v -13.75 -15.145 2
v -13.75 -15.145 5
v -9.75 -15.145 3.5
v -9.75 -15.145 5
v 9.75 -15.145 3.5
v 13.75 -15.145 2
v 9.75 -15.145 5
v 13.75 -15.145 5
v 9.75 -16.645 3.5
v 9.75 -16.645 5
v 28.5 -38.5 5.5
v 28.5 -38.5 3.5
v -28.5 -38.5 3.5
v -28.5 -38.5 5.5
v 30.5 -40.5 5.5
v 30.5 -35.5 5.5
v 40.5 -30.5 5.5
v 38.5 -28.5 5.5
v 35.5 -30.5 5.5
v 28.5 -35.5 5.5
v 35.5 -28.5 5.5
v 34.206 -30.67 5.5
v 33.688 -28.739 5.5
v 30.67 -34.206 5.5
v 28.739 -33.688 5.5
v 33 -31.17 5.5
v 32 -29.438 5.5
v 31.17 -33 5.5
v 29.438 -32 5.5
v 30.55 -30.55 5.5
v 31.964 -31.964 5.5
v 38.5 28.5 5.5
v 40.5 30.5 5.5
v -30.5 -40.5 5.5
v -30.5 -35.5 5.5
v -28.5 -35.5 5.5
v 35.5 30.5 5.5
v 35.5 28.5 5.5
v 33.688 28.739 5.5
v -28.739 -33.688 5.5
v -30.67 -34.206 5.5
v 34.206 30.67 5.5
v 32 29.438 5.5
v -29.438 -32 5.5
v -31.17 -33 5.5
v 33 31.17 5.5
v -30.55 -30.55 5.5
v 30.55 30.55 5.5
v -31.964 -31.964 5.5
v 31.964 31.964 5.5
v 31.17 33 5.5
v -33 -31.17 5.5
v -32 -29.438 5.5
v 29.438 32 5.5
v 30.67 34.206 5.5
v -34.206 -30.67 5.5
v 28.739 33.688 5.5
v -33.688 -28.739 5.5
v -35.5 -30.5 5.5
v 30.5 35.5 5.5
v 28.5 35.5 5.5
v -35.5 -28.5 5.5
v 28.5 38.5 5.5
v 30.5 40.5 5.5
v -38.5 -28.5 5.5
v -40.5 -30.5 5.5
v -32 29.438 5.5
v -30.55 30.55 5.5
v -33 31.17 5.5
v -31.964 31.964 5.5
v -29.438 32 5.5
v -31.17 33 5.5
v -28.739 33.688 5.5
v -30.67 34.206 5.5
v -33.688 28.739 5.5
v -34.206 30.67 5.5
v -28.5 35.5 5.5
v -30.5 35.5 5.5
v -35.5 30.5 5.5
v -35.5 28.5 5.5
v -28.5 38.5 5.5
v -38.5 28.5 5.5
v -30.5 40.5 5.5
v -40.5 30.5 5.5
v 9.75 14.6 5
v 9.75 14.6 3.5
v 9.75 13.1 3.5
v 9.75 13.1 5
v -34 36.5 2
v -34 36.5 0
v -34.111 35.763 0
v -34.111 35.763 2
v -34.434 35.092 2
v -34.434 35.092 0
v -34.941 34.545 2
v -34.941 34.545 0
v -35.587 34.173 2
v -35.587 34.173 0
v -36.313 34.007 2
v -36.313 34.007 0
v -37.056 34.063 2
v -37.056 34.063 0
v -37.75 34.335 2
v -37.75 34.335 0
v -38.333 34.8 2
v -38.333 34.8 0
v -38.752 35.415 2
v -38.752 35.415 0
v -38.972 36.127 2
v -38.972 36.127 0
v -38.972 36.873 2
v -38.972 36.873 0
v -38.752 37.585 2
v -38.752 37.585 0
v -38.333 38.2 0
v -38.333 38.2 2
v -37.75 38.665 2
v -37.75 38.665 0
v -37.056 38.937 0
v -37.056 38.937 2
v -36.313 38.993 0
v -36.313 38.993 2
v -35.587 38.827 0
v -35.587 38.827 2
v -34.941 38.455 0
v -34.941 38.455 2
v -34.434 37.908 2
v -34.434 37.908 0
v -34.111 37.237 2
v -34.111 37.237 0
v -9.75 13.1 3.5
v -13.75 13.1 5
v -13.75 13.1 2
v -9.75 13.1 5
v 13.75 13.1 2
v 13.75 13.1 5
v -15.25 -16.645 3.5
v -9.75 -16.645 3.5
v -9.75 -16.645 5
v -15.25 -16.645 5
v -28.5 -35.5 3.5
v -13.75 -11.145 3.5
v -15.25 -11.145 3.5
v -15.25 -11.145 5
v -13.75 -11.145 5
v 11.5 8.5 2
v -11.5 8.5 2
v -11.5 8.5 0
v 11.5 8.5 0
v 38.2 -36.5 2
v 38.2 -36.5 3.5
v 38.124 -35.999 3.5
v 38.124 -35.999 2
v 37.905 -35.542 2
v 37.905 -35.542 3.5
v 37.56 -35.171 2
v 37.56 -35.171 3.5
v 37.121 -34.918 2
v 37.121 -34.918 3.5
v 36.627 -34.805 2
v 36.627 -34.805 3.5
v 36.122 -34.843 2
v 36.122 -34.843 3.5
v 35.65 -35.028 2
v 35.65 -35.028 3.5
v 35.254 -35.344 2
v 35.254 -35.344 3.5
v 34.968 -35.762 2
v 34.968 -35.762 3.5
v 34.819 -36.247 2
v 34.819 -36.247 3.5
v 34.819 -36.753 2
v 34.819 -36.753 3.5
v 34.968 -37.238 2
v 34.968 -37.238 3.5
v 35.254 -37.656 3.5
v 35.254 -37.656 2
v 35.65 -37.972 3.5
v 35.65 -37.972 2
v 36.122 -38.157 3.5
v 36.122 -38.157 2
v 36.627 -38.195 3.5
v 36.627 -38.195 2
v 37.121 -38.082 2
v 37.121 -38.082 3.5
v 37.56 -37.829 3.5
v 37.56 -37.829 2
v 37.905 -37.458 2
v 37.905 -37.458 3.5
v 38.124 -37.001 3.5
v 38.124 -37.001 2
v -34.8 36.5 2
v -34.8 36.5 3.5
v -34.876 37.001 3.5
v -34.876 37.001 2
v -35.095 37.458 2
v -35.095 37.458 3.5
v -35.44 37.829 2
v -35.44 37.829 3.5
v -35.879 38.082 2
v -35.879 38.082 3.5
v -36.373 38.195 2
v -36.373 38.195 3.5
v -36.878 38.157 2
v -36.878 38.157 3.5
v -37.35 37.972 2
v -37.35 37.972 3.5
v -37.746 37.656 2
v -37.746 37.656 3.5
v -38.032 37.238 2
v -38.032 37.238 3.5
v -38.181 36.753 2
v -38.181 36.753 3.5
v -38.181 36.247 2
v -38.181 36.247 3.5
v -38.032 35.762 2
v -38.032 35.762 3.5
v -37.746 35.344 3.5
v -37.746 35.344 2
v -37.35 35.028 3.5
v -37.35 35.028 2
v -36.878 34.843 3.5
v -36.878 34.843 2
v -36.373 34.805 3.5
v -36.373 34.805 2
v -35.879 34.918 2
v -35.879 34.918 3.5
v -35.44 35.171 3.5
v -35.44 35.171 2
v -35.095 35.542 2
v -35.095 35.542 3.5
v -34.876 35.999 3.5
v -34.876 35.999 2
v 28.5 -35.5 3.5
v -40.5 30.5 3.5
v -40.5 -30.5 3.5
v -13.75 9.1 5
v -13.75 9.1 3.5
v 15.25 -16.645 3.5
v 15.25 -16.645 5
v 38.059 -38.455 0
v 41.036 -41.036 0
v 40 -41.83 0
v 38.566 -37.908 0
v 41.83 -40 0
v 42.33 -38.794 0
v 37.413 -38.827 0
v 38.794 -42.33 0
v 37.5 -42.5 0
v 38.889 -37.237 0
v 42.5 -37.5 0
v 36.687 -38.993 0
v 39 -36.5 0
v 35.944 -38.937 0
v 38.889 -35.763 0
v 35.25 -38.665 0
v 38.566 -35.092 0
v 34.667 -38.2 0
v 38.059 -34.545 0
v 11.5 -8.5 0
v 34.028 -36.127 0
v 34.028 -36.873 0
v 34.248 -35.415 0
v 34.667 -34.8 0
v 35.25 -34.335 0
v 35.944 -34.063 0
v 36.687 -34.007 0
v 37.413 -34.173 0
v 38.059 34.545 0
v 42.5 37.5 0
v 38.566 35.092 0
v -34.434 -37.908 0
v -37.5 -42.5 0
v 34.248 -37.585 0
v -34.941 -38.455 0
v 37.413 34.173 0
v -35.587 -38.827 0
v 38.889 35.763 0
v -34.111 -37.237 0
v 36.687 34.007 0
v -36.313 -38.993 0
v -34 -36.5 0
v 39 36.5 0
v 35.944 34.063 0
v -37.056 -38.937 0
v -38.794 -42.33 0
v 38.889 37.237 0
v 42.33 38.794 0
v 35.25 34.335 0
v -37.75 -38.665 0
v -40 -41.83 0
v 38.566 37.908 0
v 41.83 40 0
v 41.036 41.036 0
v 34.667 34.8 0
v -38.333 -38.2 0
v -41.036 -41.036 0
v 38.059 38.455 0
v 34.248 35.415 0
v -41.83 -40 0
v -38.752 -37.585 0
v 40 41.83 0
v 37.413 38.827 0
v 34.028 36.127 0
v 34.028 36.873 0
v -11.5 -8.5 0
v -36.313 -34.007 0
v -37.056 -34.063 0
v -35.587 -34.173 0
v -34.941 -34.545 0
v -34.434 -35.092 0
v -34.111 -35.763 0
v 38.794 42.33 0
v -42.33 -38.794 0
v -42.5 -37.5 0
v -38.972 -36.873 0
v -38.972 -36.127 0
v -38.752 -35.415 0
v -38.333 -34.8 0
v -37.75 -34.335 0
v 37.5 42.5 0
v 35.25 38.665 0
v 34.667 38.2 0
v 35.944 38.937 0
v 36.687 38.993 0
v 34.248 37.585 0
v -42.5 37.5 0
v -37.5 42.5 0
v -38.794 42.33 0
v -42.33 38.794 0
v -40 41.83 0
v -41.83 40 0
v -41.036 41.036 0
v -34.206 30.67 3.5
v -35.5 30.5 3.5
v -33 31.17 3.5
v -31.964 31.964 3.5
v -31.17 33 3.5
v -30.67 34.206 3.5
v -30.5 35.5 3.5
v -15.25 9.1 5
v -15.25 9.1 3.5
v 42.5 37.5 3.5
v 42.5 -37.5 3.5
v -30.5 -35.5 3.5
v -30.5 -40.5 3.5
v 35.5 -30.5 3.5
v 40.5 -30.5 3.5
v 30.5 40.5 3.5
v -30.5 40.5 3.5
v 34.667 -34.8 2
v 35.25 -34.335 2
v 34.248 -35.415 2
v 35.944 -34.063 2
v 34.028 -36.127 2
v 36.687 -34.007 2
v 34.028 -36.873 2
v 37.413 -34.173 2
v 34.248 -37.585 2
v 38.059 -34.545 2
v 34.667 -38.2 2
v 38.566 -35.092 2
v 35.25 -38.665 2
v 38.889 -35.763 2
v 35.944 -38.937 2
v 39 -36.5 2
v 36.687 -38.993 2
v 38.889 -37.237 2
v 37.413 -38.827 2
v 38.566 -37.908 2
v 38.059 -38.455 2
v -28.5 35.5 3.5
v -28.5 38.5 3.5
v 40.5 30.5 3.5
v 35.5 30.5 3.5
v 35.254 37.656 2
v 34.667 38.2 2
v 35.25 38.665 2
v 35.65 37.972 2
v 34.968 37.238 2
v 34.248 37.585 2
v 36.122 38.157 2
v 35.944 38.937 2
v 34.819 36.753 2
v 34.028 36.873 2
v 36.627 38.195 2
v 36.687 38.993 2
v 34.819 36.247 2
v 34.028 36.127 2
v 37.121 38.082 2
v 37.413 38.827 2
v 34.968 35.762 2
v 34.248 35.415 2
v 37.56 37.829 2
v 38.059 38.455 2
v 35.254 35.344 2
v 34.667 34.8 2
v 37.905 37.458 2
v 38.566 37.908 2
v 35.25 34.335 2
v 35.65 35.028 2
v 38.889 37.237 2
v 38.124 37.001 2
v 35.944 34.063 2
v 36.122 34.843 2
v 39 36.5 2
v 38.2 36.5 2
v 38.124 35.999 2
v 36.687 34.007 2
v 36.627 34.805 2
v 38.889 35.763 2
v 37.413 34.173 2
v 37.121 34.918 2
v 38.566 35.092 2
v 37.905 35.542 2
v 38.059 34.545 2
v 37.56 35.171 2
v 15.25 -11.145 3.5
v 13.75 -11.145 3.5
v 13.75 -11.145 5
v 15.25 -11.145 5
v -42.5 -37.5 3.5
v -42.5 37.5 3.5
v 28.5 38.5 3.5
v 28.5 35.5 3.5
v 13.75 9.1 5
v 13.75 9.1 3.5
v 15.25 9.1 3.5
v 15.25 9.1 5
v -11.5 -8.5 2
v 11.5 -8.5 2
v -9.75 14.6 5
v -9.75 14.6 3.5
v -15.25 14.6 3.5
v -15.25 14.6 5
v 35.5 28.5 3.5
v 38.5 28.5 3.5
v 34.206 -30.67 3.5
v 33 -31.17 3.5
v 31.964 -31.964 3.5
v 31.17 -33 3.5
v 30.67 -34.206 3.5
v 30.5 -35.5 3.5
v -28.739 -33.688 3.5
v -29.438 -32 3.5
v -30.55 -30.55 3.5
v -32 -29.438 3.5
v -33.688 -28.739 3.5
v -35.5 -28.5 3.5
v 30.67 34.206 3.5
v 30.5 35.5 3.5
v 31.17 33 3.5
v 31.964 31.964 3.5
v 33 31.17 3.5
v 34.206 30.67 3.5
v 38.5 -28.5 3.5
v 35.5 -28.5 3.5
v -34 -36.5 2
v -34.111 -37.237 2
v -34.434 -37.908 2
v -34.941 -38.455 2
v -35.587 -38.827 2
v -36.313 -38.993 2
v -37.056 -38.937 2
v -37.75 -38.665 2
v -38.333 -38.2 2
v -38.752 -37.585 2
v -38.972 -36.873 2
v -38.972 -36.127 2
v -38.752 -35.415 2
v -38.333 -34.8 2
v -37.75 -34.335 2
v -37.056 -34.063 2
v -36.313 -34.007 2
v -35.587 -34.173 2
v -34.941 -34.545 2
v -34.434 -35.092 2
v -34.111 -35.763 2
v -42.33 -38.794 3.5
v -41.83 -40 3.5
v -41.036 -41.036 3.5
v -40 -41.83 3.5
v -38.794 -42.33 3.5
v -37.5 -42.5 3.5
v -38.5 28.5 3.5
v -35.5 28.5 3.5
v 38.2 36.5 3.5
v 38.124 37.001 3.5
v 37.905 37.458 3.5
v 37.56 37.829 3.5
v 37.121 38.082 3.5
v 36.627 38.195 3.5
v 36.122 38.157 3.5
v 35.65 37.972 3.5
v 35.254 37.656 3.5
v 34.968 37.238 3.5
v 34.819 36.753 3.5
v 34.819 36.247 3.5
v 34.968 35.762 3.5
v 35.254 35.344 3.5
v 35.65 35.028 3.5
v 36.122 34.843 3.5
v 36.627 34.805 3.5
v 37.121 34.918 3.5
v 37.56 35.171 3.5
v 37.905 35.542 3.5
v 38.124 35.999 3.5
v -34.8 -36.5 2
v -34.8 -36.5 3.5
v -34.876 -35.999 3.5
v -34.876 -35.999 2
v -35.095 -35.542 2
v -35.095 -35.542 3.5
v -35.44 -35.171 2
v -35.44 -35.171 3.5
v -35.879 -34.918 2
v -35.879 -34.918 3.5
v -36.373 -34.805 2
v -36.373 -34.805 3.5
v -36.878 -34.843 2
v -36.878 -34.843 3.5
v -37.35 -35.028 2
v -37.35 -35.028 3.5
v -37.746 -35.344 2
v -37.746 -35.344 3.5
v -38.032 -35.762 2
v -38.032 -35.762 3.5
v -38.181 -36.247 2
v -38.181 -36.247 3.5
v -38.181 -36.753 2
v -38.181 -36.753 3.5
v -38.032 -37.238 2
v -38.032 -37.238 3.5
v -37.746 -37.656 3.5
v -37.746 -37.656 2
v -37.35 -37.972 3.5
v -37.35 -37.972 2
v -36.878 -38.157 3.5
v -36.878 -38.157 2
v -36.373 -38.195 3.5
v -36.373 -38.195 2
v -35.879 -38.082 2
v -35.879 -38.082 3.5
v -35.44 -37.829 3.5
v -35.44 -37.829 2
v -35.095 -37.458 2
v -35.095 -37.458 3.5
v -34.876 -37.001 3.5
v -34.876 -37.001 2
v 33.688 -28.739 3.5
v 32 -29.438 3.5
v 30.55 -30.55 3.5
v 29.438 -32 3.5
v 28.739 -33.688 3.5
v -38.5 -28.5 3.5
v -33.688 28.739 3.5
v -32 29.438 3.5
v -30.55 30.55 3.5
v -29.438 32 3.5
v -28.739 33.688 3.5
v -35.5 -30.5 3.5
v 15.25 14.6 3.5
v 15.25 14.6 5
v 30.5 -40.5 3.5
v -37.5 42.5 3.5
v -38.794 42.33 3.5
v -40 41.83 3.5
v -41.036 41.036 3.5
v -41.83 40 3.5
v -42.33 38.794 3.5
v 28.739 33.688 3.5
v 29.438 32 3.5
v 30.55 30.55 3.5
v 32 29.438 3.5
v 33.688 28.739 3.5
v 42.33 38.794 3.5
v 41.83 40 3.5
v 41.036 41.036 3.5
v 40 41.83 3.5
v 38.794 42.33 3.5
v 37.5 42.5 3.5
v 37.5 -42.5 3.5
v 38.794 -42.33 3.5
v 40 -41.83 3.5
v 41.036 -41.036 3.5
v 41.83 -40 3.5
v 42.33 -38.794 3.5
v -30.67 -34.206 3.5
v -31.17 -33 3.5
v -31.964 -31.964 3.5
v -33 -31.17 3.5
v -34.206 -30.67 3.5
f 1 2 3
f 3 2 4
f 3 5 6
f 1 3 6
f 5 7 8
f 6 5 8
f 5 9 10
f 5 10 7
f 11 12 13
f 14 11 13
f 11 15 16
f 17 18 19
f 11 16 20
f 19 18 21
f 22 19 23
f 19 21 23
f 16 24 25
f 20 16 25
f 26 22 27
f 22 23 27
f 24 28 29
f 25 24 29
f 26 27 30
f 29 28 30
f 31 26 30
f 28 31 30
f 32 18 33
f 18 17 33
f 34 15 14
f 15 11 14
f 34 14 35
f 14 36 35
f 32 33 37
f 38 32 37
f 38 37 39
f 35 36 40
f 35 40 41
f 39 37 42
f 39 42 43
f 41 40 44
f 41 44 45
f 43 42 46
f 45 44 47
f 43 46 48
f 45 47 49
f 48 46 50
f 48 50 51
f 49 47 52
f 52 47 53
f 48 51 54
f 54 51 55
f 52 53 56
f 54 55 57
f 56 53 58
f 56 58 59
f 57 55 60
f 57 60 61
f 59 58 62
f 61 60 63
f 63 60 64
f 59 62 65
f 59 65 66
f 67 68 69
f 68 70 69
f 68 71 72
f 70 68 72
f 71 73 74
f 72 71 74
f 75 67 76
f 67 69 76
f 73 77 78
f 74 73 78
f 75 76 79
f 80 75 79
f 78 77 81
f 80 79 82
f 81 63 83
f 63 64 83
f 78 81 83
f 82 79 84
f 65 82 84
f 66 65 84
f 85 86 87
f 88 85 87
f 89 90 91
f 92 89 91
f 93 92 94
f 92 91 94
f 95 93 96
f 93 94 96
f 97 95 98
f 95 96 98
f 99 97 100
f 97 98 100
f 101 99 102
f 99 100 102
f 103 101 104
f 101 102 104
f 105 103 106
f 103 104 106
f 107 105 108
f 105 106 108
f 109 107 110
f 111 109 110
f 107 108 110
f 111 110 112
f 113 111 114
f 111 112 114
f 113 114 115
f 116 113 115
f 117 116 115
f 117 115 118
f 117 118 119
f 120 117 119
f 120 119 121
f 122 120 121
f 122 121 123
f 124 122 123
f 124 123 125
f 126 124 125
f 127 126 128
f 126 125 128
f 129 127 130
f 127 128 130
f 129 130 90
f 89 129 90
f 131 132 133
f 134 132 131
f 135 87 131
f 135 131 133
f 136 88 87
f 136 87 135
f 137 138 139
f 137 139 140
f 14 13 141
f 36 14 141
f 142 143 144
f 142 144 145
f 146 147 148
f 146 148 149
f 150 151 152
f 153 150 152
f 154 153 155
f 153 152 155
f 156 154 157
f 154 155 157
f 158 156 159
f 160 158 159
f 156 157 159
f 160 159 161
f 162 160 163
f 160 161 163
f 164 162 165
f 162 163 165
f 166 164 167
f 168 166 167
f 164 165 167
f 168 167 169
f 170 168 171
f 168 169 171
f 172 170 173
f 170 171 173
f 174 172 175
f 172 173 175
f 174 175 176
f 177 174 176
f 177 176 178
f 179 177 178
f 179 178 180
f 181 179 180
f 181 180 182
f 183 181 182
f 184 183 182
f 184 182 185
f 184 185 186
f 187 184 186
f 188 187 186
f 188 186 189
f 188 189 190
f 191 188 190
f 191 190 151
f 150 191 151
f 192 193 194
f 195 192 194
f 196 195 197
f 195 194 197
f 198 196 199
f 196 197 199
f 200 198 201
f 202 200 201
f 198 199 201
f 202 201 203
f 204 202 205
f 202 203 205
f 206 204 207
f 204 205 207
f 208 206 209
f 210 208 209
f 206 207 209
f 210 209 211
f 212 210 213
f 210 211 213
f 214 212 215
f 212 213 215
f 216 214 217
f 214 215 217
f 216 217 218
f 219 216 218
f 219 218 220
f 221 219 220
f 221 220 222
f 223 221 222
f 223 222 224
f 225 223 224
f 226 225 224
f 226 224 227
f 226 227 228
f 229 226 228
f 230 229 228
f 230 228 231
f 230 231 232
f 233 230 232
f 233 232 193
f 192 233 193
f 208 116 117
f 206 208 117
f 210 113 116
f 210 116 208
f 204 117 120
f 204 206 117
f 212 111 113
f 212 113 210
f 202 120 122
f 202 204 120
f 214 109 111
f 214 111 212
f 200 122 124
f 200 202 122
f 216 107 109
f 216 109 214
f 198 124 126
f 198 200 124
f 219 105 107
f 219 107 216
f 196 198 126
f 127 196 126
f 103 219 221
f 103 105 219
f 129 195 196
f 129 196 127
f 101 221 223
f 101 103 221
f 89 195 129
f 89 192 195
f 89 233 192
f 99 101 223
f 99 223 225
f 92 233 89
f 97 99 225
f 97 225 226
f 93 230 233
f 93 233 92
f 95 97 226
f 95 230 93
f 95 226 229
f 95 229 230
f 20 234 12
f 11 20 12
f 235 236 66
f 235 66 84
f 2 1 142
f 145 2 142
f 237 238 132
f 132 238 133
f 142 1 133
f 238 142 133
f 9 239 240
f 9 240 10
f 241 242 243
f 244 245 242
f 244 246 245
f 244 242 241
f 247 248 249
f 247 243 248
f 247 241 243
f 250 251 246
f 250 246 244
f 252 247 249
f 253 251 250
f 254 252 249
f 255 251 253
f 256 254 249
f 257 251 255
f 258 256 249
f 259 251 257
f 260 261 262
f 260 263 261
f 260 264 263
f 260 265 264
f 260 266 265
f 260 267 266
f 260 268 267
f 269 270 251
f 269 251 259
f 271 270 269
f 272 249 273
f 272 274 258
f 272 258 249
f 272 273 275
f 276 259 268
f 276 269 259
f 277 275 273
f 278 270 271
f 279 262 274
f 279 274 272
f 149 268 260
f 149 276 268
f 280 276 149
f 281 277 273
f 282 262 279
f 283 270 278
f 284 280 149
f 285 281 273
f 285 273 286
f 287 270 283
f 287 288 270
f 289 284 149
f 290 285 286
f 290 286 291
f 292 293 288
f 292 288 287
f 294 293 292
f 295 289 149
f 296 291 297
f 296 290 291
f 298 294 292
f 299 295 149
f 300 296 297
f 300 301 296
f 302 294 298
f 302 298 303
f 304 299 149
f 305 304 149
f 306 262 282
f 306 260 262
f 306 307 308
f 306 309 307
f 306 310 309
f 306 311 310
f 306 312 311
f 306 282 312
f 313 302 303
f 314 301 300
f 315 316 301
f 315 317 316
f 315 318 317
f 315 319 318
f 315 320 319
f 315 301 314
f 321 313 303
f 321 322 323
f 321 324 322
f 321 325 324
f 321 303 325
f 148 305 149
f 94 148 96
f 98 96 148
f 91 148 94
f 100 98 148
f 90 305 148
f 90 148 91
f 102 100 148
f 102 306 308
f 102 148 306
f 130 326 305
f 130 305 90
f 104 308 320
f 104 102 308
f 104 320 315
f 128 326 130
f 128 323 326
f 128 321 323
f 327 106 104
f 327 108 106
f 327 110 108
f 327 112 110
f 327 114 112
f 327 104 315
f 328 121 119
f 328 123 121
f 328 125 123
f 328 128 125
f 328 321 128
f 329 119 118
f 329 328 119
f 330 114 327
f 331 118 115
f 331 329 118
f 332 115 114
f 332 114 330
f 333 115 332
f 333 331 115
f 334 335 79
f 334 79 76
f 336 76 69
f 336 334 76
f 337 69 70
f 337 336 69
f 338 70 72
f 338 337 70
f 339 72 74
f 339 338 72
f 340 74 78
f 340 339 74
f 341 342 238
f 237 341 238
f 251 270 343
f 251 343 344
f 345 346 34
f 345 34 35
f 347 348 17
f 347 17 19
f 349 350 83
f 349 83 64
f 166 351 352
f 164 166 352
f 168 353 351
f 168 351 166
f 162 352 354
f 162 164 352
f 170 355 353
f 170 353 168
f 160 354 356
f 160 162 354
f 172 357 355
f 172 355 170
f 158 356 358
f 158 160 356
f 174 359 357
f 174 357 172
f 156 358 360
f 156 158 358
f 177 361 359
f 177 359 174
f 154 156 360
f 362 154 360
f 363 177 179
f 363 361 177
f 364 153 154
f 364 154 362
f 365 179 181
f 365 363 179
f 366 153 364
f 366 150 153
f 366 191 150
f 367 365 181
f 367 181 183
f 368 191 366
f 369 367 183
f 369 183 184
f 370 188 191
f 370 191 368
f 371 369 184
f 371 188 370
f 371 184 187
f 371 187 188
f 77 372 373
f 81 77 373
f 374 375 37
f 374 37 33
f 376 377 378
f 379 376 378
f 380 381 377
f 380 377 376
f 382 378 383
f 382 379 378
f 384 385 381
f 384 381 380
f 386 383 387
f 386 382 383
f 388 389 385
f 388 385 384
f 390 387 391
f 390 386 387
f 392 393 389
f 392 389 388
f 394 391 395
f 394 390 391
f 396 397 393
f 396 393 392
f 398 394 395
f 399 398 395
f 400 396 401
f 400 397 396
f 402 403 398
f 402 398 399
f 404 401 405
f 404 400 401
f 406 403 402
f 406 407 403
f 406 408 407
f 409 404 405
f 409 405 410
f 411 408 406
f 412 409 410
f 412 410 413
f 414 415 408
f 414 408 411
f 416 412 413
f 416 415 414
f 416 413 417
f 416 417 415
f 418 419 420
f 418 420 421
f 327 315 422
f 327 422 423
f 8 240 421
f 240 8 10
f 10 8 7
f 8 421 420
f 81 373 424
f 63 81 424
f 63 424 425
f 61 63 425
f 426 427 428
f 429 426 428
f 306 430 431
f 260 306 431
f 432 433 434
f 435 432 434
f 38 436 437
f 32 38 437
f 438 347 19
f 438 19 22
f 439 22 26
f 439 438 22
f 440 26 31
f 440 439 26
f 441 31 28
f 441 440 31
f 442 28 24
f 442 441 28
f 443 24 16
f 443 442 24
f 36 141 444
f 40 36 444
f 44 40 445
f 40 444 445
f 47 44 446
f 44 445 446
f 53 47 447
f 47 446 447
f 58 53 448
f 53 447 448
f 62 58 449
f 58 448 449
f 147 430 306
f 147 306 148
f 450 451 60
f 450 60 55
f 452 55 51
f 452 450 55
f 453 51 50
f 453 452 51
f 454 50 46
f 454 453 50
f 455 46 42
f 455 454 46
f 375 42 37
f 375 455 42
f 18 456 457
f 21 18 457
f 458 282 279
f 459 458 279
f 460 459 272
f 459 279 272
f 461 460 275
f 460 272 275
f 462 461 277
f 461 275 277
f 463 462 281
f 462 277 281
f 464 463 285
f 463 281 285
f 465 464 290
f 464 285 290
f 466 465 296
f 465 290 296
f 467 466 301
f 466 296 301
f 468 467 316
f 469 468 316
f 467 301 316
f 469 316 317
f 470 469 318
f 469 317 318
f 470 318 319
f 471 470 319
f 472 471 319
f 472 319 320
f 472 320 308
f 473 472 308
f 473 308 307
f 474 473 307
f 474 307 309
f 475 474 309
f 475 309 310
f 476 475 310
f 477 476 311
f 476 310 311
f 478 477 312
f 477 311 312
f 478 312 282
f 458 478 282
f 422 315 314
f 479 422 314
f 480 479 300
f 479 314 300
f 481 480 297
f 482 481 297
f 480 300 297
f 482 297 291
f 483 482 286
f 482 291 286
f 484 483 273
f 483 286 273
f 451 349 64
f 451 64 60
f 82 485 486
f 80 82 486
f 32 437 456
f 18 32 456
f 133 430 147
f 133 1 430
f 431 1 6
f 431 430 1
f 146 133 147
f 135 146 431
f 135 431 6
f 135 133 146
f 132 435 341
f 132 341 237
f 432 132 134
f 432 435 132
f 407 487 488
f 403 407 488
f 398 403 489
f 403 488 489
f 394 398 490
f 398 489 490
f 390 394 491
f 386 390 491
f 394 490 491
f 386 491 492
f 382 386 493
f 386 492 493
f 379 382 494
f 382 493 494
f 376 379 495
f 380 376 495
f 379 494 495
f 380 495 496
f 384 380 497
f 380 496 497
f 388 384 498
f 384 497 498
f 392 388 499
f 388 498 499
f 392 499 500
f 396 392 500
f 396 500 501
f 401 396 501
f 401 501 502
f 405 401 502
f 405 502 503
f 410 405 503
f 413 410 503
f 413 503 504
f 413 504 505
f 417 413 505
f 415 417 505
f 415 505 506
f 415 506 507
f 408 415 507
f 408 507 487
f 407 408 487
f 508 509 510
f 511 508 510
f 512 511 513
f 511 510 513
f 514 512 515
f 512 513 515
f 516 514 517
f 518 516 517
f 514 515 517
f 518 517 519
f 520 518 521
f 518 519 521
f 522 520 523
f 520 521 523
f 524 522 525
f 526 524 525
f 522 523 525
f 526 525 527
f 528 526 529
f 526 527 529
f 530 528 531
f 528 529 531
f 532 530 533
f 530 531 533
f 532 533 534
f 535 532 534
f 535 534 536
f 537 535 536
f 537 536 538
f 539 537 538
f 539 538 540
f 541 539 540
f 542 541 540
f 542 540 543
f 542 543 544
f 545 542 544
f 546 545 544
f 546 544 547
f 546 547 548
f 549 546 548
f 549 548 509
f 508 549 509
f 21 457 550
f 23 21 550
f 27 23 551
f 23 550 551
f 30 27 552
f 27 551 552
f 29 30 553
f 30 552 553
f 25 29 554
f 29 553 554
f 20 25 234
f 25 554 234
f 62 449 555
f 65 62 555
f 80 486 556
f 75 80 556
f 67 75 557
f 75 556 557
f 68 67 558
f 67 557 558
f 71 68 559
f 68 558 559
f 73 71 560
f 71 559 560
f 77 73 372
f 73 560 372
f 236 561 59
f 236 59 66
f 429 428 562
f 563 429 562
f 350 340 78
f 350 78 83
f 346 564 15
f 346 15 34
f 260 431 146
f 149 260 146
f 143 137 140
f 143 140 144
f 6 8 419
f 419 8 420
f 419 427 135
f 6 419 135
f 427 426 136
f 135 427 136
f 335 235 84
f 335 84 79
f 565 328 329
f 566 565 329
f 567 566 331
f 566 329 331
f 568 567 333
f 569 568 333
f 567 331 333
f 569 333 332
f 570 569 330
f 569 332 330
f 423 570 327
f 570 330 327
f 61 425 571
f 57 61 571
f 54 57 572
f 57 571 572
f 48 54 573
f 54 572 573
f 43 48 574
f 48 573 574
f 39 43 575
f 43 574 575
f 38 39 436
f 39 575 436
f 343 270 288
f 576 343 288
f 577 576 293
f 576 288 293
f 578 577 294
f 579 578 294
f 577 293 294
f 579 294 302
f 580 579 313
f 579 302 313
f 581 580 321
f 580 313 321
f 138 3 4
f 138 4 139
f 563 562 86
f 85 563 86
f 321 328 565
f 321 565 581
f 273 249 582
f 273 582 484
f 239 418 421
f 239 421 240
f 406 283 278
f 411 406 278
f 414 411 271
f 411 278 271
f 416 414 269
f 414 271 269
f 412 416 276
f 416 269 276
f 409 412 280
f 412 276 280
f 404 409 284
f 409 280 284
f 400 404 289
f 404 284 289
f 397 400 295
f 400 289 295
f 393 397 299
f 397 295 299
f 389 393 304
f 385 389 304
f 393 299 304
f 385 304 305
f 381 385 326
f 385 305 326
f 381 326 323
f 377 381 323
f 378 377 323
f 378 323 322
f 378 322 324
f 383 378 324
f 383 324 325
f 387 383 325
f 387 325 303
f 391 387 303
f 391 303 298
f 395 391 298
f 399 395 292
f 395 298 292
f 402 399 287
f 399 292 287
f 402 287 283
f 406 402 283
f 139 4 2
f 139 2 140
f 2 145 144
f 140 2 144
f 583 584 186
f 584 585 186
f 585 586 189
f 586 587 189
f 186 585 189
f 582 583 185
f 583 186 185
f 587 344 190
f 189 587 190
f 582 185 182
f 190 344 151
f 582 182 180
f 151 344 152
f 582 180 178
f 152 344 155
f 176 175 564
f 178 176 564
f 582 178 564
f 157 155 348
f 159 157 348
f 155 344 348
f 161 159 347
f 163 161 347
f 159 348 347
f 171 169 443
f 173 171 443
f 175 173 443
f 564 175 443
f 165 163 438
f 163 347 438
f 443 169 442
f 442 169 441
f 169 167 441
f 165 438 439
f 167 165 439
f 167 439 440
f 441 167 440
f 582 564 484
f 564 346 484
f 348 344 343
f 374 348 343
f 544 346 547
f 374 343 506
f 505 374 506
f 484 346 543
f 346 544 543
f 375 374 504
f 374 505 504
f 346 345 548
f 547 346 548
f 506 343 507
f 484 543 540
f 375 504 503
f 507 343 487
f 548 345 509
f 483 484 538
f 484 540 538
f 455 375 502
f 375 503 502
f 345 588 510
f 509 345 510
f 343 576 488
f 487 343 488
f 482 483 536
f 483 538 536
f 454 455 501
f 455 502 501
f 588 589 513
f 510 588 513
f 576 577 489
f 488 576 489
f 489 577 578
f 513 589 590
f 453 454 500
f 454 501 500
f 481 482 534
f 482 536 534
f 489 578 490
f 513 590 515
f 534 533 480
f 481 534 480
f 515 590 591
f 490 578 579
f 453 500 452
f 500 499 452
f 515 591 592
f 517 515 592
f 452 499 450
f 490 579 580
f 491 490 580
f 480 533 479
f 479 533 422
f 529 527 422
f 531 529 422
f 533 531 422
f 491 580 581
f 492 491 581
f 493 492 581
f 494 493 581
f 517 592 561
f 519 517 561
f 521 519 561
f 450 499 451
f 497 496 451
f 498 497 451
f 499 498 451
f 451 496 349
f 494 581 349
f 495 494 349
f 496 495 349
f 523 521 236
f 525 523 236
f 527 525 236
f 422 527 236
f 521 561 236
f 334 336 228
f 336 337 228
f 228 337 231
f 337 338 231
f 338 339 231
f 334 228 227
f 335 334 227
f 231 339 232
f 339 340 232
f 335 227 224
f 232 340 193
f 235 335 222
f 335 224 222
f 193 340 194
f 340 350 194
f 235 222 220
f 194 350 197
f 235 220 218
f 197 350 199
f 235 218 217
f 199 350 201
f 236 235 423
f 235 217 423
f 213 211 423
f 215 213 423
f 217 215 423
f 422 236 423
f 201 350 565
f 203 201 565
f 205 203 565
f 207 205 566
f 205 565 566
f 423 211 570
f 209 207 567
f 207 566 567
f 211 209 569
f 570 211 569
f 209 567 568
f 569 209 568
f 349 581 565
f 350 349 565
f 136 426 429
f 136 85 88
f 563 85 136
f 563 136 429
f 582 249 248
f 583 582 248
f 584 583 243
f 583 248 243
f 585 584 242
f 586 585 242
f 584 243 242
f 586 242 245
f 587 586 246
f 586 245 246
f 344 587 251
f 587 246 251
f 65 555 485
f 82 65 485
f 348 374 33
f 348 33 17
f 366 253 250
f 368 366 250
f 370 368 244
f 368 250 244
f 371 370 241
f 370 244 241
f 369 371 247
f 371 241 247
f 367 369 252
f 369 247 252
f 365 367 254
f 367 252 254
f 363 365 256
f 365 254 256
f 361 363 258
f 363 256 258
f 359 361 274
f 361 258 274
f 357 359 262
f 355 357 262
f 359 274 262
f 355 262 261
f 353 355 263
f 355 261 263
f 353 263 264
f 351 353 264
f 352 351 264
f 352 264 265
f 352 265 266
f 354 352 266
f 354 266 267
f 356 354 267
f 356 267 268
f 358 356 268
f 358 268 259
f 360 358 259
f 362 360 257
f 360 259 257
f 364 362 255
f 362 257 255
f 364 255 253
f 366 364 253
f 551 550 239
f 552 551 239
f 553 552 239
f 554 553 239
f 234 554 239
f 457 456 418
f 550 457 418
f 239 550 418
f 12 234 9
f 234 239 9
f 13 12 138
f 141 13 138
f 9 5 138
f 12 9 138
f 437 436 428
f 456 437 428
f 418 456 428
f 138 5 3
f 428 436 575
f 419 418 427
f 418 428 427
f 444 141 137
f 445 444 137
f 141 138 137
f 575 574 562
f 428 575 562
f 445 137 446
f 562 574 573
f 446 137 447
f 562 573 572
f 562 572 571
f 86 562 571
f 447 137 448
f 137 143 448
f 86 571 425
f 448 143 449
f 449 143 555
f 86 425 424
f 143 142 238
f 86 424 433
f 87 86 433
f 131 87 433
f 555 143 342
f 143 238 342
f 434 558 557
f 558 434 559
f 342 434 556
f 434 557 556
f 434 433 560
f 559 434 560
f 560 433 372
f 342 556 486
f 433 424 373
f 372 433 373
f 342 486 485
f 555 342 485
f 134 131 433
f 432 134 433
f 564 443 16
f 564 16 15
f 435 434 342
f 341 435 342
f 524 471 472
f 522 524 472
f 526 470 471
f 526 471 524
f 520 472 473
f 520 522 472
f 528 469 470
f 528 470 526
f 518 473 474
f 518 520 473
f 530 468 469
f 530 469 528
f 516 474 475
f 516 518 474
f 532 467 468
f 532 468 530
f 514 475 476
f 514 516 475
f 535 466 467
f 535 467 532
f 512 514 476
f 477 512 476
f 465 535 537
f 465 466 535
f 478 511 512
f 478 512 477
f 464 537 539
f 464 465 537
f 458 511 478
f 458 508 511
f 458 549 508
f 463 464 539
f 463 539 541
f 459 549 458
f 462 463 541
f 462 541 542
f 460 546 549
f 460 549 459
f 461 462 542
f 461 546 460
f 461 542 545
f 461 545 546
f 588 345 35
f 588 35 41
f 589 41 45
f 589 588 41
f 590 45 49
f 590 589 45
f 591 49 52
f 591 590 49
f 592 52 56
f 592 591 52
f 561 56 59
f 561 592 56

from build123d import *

# Parameters (mm, degrees)
PAD_DEPTH       = 3.5
PAD001_DEPTH    = 2
SKETCH002_R     = 1.7
POCKET_DEPTH    = 5
SKETCH003_W     = 23
SKETCH003_H     = 17
POCKET001_DEPTH = 5
SKETCH004_W     = 27.5
SKETCH004_H     = 28.2448
POCKET002_DEPTH = 1.5
PAD002_DEPTH    = 1.5
SKETCH006_R     = 2.5
POCKET003_DEPTH = 2


with BuildPart() as part:
    # Sketch → Pad (new body)
    with BuildSketch(Plane.XY):
        with BuildLine():
            Line((-37.5, 42.5), (37.5, 42.5))
            ThreePointArc((42.5, 37.5), (41.035534, 41.035534), (37.5, 42.5))
            Line((42.5, 37.5), (42.5, -37.5))
            ThreePointArc((37.5, -42.5), (41.035534, -41.035534), (42.5, -37.5))
            Line((37.5, -42.5), (-37.5, -42.5))
            ThreePointArc((-42.5, -37.5), (-41.035534, -41.035534), (-37.5, -42.5))
            Line((-42.5, -37.5), (-42.5, 37.5))
            ThreePointArc((-37.5, 42.5), (-41.035534, 41.035534), (-42.5, 37.5))
        make_face()
    extrude(amount=PAD_DEPTH)

    # Sketch001 (on Face10 of Pad) → Pad001 (join)
    with BuildSketch(Plane.XY.offset(3.5)):
        with BuildLine():
            Line((-30.5, 40.5), (30.5, 40.5))
            Line((30.5, 40.5), (30.5, 35.5))
            ThreePointArc((30.5, 35.5), (31.964466, 31.964466), (35.5, 30.5))
            Line((35.5, 30.5), (40.5, 30.5))
            Line((40.5, 30.5), (40.5, -30.5))
            Line((40.5, -30.5), (35.5, -30.5))
            ThreePointArc((35.5, -30.5), (31.964466, -31.964466), (30.5, -35.5))
            Line((30.5, -35.5), (30.5, -40.5))
            Line((30.5, -40.5), (-30.5, -40.5))
            Line((-30.5, -40.5), (-30.5, -35.5))
            ThreePointArc((-30.5, -35.5), (-31.964466, -31.964466), (-35.5, -30.5))
            Line((-35.5, -30.5), (-40.5, -30.5))
            Line((-40.5, -30.5), (-40.5, 30.5))
            Line((-40.5, 30.5), (-35.5, 30.5))
            ThreePointArc((-35.5, 30.5), (-31.964466, 31.964466), (-30.5, 35.5))
            Line((-30.5, 35.5), (-30.5, 40.5))
        make_face()
        with BuildLine():
            Line((-28.5, 38.5), (28.5, 38.5))
            Line((28.5, 38.5), (28.5, 35.5))
            ThreePointArc((28.5, 35.5), (30.550253, 30.550253), (35.5, 28.5))
            Line((35.5, 28.5), (38.5, 28.5))
            Line((38.5, 28.5), (38.5, -28.5))
            Line((38.5, -28.5), (35.5, -28.5))
            ThreePointArc((35.5, -28.5), (30.550253, -30.550253), (28.5, -35.5))
            Line((28.5, -35.5), (28.5, -38.5))
            Line((28.5, -38.5), (-28.5, -38.5))
            Line((-28.5, -38.5), (-28.5, -35.5))
            ThreePointArc((-28.5, -35.5), (-30.550253, -30.550253), (-35.5, -28.5))
            Line((-35.5, -28.5), (-38.5, -28.5))
            Line((-38.5, -28.5), (-38.5, 28.5))
            Line((-38.5, 28.5), (-35.5, 28.5))
            ThreePointArc((-35.5, 28.5), (-30.550253, 30.550253), (-28.5, 35.5))
            Line((-28.5, 35.5), (-28.5, 38.5))
        make_face(mode=Mode.SUBTRACT)
    extrude(amount=PAD001_DEPTH)

    # Sketch002 (on Face5 of Pad001) → Pocket (cut)
    with BuildSketch(Plane.XY.offset(3.5)):
        with Locations((-36.5, 36.5)):
            Circle(SKETCH002_R)
        with Locations((36.5, 36.5)):
            Circle(SKETCH002_R)
        with Locations((-36.5, -36.5)):
            Circle(SKETCH002_R)
        with Locations((36.5, -36.5)):
            Circle(SKETCH002_R)
    extrude(amount=-POCKET_DEPTH, mode=Mode.SUBTRACT)

    # Sketch003 (on Face48 of Pocket) → Pocket001 (cut)
    with BuildSketch(Plane.XY.offset(3.5)):
        Rectangle(SKETCH003_W, SKETCH003_H)
    extrude(amount=-POCKET001_DEPTH, mode=Mode.SUBTRACT)

    # Sketch004 (on Face35 of Pocket001) → Pocket002 (cut)
    with BuildSketch(Plane.XY.offset(3.5)):
        with Locations((0, -1.0224)):
            Rectangle(SKETCH004_W, SKETCH004_H)
    extrude(amount=-POCKET002_DEPTH, mode=Mode.SUBTRACT)

    # Sketch005 (on Face57 of Pocket002) → Pad002 (join)
    with BuildSketch(Plane.XY.offset(3.5)):
        Polygon((-15.25, 14.6), (-15.25, 9.1), (-13.75, 9.1), (-13.75, 13.1), (-9.75, 13.1), (-9.75, 14.6), align=None)
        Polygon((9.75, 13.1), (13.75, 13.1), (13.75, 9.1), (15.25, 9.1), (15.25, 14.6), (9.75, 14.6), align=None)
        Polygon((9.75, -15.1448), (13.75, -15.1448), (13.75, -11.1448), (15.25, -11.1448), (15.25, -16.6448), (9.75, -16.6448), align=None)
        Polygon((-13.75, -11.1448), (-13.75, -15.1448), (-9.75, -15.1448), (-9.75, -16.6448), (-15.25, -16.6448), (-15.25, -11.1448), align=None)
    extrude(amount=PAD002_DEPTH)

    # Sketch006 (on Face4 of Pad002) → Pocket003 (cut)
    with BuildSketch(Plane(origin=(0, 0, 0), x_dir=(1, 0, 0), z_dir=(0, 0, -1))):
        with Locations((-36.5, 36.5)):
            Circle(SKETCH006_R)
        with Locations((36.5, 36.5)):
            Circle(SKETCH006_R)
        with Locations((36.5, -36.5)):
            Circle(SKETCH006_R)
        with Locations((-36.5, -36.5)):
            Circle(SKETCH006_R)
    extrude(amount=-POCKET003_DEPTH, mode=Mode.SUBTRACT)


solid = part.part
